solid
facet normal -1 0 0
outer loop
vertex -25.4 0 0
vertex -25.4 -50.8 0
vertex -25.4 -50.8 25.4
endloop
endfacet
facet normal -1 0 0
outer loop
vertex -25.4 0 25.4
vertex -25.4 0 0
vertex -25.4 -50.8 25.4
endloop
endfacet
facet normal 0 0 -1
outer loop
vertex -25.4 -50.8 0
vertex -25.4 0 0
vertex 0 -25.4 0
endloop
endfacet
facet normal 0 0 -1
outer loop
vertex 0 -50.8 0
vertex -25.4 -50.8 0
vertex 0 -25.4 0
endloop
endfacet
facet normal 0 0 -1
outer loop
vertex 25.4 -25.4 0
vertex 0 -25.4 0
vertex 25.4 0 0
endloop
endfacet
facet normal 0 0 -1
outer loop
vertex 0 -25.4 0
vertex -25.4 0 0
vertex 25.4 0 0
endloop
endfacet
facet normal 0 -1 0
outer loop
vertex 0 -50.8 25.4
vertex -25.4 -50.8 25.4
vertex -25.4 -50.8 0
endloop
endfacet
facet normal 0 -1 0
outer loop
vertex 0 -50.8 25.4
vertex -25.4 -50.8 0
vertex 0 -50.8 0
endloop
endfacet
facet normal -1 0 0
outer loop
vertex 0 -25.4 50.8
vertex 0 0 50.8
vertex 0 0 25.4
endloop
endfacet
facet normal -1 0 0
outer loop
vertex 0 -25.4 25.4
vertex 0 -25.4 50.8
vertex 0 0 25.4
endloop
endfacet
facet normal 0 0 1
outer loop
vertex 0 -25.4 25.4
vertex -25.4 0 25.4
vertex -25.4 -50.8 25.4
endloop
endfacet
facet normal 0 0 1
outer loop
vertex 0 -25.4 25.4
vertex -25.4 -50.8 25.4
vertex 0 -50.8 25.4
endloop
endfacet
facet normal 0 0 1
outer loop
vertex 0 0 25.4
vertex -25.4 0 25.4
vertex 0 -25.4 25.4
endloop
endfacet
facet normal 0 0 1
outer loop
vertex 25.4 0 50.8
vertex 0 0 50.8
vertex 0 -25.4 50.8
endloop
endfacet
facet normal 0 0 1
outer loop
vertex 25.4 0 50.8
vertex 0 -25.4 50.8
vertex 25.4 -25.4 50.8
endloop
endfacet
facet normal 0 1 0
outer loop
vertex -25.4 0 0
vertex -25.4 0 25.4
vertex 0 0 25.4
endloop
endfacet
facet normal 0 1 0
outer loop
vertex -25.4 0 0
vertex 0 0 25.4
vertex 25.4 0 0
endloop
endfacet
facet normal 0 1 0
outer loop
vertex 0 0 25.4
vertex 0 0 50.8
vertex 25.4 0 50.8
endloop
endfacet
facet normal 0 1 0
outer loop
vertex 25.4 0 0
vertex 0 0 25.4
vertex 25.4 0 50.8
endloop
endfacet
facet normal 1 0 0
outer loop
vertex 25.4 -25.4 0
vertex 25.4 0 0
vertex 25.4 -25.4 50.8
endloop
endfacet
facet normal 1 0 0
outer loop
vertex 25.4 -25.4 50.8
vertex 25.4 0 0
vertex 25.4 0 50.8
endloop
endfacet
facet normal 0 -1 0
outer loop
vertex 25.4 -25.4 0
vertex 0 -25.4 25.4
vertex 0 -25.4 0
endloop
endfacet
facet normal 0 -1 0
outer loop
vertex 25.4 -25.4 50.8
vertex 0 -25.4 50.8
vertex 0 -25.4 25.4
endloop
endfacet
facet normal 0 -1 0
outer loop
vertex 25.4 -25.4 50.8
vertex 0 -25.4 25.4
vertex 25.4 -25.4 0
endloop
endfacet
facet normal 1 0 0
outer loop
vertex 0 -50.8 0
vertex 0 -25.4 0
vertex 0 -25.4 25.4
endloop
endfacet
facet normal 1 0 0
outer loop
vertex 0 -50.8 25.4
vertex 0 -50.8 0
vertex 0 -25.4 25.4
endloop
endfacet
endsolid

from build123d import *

# Parameters (mm, degrees)
F0_W     = 25.4
F0_H     = 25.4
F1_DEPTH = 50.8
F2_DEPTH = 25.4


with BuildPart() as f1:
    # F0 (on Front) → F1 (new body)
    with BuildSketch(Plane.XZ):
        with Locations((-12.7, 12.7)):
            Rectangle(F0_W, F0_H)
    extrude(amount=F1_DEPTH)

    # F0 (on Front) → F2 (join)
    with BuildSketch(Plane.XZ):
        with Locations((12.7, 38.1)):
            Rectangle(F0_W, F0_H)
        with Locations((12.7, 12.7)):
            Rectangle(F0_W, F0_H)
    extrude(amount=F2_DEPTH)


solid = f1.part
